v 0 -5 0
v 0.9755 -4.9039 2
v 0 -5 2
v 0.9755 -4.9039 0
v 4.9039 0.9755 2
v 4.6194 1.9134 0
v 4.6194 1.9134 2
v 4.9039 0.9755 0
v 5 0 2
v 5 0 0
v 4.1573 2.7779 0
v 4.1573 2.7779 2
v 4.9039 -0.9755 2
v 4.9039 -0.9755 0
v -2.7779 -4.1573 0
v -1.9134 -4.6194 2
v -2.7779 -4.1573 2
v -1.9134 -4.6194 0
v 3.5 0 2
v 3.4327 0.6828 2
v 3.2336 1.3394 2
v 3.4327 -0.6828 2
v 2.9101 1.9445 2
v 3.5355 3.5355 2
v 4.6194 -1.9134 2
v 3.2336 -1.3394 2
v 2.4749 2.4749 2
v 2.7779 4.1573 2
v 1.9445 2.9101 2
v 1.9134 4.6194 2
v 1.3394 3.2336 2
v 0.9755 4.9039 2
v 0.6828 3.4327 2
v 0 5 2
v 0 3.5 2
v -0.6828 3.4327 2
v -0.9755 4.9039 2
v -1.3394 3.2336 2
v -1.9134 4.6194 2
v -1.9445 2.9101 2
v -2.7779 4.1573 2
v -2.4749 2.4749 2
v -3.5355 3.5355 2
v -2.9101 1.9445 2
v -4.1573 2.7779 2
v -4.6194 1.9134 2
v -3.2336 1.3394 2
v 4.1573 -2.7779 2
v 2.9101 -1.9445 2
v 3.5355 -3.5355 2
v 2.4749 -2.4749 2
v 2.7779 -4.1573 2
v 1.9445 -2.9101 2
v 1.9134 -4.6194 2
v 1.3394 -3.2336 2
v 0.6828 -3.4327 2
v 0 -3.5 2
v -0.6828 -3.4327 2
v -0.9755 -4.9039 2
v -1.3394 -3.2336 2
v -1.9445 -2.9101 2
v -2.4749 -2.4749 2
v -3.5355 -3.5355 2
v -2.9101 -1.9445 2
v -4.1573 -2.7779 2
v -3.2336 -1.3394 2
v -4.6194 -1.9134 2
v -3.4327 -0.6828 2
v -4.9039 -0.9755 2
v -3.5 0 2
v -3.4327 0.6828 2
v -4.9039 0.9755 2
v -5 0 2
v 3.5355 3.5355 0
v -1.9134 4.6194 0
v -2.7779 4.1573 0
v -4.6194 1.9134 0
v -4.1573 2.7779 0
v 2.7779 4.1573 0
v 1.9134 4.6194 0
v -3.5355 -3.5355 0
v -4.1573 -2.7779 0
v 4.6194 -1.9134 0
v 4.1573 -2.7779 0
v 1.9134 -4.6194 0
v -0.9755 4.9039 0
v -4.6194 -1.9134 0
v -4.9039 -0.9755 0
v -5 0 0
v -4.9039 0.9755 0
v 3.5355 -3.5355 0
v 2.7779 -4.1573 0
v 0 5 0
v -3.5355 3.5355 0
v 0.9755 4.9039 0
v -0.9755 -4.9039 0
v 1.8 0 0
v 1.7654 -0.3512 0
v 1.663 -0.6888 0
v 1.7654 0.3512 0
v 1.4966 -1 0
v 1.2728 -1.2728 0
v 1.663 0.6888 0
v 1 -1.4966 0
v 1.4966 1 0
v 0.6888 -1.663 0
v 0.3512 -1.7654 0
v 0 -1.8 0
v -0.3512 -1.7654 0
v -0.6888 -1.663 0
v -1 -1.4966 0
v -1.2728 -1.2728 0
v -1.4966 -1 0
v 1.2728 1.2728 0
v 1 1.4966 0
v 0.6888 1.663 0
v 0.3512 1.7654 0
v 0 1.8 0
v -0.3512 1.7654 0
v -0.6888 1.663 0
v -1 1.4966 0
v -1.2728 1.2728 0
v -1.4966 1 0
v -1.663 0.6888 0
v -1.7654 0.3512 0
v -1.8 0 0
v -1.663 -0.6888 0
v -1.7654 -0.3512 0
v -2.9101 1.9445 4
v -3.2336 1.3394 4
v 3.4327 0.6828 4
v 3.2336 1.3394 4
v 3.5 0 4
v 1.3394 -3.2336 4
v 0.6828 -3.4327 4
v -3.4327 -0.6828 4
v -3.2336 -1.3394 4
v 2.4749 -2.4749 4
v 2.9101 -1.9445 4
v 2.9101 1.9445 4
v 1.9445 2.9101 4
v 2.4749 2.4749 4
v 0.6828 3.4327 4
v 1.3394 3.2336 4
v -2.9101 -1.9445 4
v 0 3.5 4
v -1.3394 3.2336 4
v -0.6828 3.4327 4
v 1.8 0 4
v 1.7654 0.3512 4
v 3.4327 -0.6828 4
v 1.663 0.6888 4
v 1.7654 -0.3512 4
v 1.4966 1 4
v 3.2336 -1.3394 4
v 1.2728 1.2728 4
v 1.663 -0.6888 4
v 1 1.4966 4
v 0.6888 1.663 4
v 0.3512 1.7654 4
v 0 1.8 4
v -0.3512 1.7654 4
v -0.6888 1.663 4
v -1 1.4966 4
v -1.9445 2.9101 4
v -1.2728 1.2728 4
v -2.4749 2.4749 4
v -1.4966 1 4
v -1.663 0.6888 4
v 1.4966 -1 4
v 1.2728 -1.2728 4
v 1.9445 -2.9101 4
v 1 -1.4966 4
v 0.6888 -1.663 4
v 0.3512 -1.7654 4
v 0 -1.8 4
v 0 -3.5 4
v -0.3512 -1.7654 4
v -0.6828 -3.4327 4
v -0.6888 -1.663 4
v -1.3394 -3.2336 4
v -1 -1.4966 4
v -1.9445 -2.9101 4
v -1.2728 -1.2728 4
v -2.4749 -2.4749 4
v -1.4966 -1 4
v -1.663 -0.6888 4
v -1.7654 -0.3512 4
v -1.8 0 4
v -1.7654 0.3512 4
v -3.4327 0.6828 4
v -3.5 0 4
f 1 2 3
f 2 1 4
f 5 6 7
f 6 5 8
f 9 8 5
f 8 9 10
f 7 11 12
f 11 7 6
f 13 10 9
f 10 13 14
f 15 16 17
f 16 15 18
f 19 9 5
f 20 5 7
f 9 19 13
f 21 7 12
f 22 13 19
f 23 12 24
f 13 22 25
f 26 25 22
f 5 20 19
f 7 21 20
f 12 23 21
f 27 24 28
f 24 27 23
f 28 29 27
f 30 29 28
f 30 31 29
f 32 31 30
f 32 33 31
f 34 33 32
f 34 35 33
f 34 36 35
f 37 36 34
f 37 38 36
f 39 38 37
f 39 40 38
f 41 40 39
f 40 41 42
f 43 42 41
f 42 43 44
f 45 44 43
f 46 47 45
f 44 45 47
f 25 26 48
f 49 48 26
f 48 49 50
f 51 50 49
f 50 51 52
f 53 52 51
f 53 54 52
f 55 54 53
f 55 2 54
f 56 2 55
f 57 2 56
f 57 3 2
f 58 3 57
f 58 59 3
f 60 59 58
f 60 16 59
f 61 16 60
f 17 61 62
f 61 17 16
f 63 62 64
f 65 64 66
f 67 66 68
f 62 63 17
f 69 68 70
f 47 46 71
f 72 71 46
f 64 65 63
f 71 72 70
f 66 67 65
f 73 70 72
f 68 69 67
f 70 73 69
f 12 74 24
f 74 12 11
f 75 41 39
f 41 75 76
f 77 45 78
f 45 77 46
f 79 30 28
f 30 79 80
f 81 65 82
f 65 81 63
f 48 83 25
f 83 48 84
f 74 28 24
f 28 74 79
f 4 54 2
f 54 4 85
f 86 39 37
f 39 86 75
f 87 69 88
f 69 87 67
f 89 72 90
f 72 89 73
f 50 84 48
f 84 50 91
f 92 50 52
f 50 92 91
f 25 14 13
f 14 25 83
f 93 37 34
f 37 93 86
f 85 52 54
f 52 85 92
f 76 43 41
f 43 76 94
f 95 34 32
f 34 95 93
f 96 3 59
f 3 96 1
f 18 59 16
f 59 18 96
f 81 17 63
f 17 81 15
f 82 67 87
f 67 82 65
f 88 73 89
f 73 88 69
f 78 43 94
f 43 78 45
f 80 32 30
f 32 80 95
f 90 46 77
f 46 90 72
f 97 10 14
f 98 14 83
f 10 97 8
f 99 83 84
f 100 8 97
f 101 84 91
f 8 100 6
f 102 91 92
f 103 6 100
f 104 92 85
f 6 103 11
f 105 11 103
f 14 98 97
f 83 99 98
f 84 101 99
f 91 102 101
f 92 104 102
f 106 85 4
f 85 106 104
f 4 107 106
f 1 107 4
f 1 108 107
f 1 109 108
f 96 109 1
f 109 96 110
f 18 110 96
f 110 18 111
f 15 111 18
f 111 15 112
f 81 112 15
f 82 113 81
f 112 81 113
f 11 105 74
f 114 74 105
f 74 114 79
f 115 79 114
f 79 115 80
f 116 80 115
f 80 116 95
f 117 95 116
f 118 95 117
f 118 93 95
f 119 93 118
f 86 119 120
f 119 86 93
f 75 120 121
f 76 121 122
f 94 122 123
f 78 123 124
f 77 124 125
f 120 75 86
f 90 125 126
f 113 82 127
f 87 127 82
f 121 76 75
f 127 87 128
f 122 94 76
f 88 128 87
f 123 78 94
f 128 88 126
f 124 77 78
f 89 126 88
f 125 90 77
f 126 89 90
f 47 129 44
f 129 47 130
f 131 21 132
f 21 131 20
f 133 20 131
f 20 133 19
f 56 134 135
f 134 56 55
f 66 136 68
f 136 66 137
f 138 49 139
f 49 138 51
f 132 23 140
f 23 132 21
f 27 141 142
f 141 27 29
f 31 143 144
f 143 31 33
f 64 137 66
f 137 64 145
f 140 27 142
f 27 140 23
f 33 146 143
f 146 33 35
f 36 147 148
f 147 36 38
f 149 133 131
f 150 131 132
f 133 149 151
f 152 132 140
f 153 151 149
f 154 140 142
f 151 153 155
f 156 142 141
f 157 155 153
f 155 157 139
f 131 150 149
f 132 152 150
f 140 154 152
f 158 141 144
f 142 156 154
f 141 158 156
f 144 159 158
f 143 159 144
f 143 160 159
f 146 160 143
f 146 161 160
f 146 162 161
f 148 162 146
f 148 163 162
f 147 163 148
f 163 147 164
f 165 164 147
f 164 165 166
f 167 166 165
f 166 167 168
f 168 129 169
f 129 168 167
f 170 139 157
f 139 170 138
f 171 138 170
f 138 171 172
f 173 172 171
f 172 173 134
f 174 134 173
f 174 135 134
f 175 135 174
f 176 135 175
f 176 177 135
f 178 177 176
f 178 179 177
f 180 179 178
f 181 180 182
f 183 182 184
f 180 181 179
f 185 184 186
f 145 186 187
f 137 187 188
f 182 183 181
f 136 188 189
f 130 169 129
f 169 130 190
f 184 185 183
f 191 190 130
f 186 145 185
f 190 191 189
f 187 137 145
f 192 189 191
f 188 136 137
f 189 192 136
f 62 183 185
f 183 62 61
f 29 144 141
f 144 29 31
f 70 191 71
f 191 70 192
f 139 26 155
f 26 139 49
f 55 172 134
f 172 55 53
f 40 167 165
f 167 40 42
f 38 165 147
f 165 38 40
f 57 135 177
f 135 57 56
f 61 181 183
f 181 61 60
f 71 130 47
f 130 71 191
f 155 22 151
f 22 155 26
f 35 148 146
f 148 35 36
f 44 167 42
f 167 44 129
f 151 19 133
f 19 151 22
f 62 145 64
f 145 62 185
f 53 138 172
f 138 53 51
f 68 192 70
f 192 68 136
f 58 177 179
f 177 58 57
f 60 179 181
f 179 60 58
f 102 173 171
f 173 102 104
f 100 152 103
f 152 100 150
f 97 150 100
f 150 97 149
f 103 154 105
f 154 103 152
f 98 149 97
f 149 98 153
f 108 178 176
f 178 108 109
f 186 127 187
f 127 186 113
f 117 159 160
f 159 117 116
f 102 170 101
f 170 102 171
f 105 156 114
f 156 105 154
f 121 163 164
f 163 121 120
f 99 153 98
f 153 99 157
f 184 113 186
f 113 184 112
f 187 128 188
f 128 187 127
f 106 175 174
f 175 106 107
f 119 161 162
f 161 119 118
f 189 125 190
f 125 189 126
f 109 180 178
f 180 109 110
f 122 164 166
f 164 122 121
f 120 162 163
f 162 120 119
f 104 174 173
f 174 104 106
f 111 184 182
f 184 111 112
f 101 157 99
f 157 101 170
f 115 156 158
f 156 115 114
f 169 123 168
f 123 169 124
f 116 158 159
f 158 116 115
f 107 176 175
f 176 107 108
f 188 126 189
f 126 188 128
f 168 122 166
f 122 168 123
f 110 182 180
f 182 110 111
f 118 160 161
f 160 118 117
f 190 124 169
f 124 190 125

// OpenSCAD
// file: functions.scad
// PRUSA Mendel  
// Functions used in many files
// GNU GPL v2
// Josef Průša
// josefprusa@me.com
// prusadjs.cz
// http://www.reprap.org/wiki/Prusa_Mendel
// http://github.com/prusajr/PrusaMendel

module nut( d, h, horizontal = true )
{
	cornerdiameter = ( d / 2 ) / cos( 180 / 6 );
	cylinder( h = h, r = cornerdiameter, $fn = 6 );
	if( horizontal )
	{
		for( i = [1 : 6] )
		{
			rotate( [0, 0, 60 * i] ) translate( [-cornerdiameter - 0.2, 0, 0] ) rotate( [0, 0, -45] ) cube( size = [2, 2, h] );
		}
	}
}

// By nophead
module polyhole( d, h ) 
{
	n = max( round( 2 * d ), 3 );
	rotate( [0, 0, 180] ) cylinder( h = h, r = ( d / 2 ) / cos( 180 / n ), $fn = n );
}

module roundcorner( diameter )
{
	difference()
	{
		cube( size = [diameter, diameter, 99], center = false );
		translate( v = [diameter, diameter, 0] ) cylinder( h = 100, r = diameter, center = true );
	}
}
// file: metric.scad
// PRUSA Mendel  
// Default metric sizes
// GNU GPL v2
// Josef Průša
// josefprusa@me.com
// prusadjs.cz
// http://www.reprap.org/wiki/Prusa_Mendel
// http://github.com/prusajr/PrusaMendel

// DONT CHANGE THIS FILE! ALTER VALUES IN CONFIGURATION.SCAD INSTEAD

// RODS

threaded_rod_diameter = 8.2;
threaded_rod_diameter_horizontal = 8.2;
smooth_bar_diameter = 8;
smooth_bar_diameter_horizontal = 8.5;

// Nuts and bolts

m8_diameter = 9;
m8_nut_diameter = 16.4;

m4_diameter = 4.5;
m4_nut_diameter = 9;

m3_diameter = 3.6;
m3_nut_diameter = 6.1;

// Bushing holder

bushing_core_diameter = smooth_bar_diameter;
bushing_material_thickness = 1;

// Motors

motor_shaft = 5.5;
// file: configuration.scad
// PRUSA Mendel  
// Configuration file
// GNU GPL v2
// Josef Průša
// josefprusa@me.com
// prusadjs.cz
// http://www.reprap.org/wiki/Prusa_Mendel
// http://github.com/prusajr/PrusaMendel

// PLEASE SELECT ONE OF THE CONFIGURATIONS BELOW
// BY UN-COMMENTING IT

// Uncomment for metric settings
// METRIC METRIC METRIC METRIC METRIC METRIC METRIC METRIC 

include <metric.scad>;

// Uncomment for imperial settings
// IMPERIAL IMPERIAL IMPERIAL IMPERIAL IMPERIAL IMPERIAL IMPERIAL 

//include <sae.scad>;

// CUSTOM CUSTOM CUSTOM CUSTOM CUSTOM CUSTOM CUSTOM CUSTOM CUSTOM

// Thin walls
layer_height = 0.3;
wot = 1.5;
filament_width = layer_height * wot;

thin_wall = 4 * layer_height * wot;

// LM8UU
linear = true;
linear_bearing_diameter = 15;
linear_bearing_length = 24;

//608 bearing
bearing_diameter = 22;
bearing_thickness = 7;

//Timing belt
belt_pitch = 5;

// CHANGE ONLY THE STUFF YOU KNOW
// IT WILL REPLACE DEFAULT SETTING

// RODS

// threaded_rod_diameter = 0;
// threaded_rod_diameter_horizontal = 0;
// smooth_bar_díameter = 0;
// smooth_bar_díameter_horizontal = 0;

// Nuts and bolts

// m8_diameter = 0;
// m8_nut_diameter = 0;
// m8_nut_thickness = 0;

// m4_diameter = 0;
 m4_nut_diameter = 8.5;
// m4_nut_thickness = 0;

// m3_diameter = 0;
// m3_nut_diameter = 0;
m3_nut_thickness = 3;

// Bushing holder

// bushing_core_diameter = smooth_bar_díameter;
// bushing_material_thickness = 0;

///counted stuff
m3_nut_diameter_bigger = ( ( m3_nut_diameter  / 2) / cos( 180 / 6 ) ) * 2;

// functions 
include <functions.scad>
// main file
/*
    Author: Andy Kirby, Email: andy@kirbyand.co.uk, Date: 27/12/2010
    Contributors: 
    Licensing GPL V3 (http://www.gnu.org/licenses/quick-guide-gplv3.html).

    Script to create a Spring Seat used to centre and retain springs on a rod or bolt.
*/

include <configuration.scad>

/* Global Variables */
// Parameters to change the parts vital dimensions
seath = 4;                // overall height of spring seat (mm)
holeid = m3_diameter;               // Inside Diameter of centre hole (mm)
springid = 8;            // Inside Diameter of spring (mm)
springod = 10;	     // Outside Diameter of spring
smoothness = 32;  // Number of facets making up the circles in the piece


// Do not change precalculated factors.
sectionh = seath / 2;
holer = holeid / 2;
springir = (springid / 2) - 0.5; // 0.25mm clearence for spring to fit over retainer
springor = springod / 2;


/* Main or start function basicaly do it */
render (convexity = 1) {
   springseat();
}

/* The part description */
module springseat() {
   difference() {
     // from the spring seat solid
        union(){
            // base washer
               cylinder(h=sectionh, r1=springor, r2=springor, center=false, $fn=smoothness);
            // retainer section
               translate(v = [0, 0, sectionh] ) cylinder(h=sectionh, r1=springir, r2=springir, center=false, $fn=smoothness);
         }
         // subtract the hole 
           cylinder(h=seath, r1=holer, r2=holer, center=false, $fn=smoothness);
   }
}
